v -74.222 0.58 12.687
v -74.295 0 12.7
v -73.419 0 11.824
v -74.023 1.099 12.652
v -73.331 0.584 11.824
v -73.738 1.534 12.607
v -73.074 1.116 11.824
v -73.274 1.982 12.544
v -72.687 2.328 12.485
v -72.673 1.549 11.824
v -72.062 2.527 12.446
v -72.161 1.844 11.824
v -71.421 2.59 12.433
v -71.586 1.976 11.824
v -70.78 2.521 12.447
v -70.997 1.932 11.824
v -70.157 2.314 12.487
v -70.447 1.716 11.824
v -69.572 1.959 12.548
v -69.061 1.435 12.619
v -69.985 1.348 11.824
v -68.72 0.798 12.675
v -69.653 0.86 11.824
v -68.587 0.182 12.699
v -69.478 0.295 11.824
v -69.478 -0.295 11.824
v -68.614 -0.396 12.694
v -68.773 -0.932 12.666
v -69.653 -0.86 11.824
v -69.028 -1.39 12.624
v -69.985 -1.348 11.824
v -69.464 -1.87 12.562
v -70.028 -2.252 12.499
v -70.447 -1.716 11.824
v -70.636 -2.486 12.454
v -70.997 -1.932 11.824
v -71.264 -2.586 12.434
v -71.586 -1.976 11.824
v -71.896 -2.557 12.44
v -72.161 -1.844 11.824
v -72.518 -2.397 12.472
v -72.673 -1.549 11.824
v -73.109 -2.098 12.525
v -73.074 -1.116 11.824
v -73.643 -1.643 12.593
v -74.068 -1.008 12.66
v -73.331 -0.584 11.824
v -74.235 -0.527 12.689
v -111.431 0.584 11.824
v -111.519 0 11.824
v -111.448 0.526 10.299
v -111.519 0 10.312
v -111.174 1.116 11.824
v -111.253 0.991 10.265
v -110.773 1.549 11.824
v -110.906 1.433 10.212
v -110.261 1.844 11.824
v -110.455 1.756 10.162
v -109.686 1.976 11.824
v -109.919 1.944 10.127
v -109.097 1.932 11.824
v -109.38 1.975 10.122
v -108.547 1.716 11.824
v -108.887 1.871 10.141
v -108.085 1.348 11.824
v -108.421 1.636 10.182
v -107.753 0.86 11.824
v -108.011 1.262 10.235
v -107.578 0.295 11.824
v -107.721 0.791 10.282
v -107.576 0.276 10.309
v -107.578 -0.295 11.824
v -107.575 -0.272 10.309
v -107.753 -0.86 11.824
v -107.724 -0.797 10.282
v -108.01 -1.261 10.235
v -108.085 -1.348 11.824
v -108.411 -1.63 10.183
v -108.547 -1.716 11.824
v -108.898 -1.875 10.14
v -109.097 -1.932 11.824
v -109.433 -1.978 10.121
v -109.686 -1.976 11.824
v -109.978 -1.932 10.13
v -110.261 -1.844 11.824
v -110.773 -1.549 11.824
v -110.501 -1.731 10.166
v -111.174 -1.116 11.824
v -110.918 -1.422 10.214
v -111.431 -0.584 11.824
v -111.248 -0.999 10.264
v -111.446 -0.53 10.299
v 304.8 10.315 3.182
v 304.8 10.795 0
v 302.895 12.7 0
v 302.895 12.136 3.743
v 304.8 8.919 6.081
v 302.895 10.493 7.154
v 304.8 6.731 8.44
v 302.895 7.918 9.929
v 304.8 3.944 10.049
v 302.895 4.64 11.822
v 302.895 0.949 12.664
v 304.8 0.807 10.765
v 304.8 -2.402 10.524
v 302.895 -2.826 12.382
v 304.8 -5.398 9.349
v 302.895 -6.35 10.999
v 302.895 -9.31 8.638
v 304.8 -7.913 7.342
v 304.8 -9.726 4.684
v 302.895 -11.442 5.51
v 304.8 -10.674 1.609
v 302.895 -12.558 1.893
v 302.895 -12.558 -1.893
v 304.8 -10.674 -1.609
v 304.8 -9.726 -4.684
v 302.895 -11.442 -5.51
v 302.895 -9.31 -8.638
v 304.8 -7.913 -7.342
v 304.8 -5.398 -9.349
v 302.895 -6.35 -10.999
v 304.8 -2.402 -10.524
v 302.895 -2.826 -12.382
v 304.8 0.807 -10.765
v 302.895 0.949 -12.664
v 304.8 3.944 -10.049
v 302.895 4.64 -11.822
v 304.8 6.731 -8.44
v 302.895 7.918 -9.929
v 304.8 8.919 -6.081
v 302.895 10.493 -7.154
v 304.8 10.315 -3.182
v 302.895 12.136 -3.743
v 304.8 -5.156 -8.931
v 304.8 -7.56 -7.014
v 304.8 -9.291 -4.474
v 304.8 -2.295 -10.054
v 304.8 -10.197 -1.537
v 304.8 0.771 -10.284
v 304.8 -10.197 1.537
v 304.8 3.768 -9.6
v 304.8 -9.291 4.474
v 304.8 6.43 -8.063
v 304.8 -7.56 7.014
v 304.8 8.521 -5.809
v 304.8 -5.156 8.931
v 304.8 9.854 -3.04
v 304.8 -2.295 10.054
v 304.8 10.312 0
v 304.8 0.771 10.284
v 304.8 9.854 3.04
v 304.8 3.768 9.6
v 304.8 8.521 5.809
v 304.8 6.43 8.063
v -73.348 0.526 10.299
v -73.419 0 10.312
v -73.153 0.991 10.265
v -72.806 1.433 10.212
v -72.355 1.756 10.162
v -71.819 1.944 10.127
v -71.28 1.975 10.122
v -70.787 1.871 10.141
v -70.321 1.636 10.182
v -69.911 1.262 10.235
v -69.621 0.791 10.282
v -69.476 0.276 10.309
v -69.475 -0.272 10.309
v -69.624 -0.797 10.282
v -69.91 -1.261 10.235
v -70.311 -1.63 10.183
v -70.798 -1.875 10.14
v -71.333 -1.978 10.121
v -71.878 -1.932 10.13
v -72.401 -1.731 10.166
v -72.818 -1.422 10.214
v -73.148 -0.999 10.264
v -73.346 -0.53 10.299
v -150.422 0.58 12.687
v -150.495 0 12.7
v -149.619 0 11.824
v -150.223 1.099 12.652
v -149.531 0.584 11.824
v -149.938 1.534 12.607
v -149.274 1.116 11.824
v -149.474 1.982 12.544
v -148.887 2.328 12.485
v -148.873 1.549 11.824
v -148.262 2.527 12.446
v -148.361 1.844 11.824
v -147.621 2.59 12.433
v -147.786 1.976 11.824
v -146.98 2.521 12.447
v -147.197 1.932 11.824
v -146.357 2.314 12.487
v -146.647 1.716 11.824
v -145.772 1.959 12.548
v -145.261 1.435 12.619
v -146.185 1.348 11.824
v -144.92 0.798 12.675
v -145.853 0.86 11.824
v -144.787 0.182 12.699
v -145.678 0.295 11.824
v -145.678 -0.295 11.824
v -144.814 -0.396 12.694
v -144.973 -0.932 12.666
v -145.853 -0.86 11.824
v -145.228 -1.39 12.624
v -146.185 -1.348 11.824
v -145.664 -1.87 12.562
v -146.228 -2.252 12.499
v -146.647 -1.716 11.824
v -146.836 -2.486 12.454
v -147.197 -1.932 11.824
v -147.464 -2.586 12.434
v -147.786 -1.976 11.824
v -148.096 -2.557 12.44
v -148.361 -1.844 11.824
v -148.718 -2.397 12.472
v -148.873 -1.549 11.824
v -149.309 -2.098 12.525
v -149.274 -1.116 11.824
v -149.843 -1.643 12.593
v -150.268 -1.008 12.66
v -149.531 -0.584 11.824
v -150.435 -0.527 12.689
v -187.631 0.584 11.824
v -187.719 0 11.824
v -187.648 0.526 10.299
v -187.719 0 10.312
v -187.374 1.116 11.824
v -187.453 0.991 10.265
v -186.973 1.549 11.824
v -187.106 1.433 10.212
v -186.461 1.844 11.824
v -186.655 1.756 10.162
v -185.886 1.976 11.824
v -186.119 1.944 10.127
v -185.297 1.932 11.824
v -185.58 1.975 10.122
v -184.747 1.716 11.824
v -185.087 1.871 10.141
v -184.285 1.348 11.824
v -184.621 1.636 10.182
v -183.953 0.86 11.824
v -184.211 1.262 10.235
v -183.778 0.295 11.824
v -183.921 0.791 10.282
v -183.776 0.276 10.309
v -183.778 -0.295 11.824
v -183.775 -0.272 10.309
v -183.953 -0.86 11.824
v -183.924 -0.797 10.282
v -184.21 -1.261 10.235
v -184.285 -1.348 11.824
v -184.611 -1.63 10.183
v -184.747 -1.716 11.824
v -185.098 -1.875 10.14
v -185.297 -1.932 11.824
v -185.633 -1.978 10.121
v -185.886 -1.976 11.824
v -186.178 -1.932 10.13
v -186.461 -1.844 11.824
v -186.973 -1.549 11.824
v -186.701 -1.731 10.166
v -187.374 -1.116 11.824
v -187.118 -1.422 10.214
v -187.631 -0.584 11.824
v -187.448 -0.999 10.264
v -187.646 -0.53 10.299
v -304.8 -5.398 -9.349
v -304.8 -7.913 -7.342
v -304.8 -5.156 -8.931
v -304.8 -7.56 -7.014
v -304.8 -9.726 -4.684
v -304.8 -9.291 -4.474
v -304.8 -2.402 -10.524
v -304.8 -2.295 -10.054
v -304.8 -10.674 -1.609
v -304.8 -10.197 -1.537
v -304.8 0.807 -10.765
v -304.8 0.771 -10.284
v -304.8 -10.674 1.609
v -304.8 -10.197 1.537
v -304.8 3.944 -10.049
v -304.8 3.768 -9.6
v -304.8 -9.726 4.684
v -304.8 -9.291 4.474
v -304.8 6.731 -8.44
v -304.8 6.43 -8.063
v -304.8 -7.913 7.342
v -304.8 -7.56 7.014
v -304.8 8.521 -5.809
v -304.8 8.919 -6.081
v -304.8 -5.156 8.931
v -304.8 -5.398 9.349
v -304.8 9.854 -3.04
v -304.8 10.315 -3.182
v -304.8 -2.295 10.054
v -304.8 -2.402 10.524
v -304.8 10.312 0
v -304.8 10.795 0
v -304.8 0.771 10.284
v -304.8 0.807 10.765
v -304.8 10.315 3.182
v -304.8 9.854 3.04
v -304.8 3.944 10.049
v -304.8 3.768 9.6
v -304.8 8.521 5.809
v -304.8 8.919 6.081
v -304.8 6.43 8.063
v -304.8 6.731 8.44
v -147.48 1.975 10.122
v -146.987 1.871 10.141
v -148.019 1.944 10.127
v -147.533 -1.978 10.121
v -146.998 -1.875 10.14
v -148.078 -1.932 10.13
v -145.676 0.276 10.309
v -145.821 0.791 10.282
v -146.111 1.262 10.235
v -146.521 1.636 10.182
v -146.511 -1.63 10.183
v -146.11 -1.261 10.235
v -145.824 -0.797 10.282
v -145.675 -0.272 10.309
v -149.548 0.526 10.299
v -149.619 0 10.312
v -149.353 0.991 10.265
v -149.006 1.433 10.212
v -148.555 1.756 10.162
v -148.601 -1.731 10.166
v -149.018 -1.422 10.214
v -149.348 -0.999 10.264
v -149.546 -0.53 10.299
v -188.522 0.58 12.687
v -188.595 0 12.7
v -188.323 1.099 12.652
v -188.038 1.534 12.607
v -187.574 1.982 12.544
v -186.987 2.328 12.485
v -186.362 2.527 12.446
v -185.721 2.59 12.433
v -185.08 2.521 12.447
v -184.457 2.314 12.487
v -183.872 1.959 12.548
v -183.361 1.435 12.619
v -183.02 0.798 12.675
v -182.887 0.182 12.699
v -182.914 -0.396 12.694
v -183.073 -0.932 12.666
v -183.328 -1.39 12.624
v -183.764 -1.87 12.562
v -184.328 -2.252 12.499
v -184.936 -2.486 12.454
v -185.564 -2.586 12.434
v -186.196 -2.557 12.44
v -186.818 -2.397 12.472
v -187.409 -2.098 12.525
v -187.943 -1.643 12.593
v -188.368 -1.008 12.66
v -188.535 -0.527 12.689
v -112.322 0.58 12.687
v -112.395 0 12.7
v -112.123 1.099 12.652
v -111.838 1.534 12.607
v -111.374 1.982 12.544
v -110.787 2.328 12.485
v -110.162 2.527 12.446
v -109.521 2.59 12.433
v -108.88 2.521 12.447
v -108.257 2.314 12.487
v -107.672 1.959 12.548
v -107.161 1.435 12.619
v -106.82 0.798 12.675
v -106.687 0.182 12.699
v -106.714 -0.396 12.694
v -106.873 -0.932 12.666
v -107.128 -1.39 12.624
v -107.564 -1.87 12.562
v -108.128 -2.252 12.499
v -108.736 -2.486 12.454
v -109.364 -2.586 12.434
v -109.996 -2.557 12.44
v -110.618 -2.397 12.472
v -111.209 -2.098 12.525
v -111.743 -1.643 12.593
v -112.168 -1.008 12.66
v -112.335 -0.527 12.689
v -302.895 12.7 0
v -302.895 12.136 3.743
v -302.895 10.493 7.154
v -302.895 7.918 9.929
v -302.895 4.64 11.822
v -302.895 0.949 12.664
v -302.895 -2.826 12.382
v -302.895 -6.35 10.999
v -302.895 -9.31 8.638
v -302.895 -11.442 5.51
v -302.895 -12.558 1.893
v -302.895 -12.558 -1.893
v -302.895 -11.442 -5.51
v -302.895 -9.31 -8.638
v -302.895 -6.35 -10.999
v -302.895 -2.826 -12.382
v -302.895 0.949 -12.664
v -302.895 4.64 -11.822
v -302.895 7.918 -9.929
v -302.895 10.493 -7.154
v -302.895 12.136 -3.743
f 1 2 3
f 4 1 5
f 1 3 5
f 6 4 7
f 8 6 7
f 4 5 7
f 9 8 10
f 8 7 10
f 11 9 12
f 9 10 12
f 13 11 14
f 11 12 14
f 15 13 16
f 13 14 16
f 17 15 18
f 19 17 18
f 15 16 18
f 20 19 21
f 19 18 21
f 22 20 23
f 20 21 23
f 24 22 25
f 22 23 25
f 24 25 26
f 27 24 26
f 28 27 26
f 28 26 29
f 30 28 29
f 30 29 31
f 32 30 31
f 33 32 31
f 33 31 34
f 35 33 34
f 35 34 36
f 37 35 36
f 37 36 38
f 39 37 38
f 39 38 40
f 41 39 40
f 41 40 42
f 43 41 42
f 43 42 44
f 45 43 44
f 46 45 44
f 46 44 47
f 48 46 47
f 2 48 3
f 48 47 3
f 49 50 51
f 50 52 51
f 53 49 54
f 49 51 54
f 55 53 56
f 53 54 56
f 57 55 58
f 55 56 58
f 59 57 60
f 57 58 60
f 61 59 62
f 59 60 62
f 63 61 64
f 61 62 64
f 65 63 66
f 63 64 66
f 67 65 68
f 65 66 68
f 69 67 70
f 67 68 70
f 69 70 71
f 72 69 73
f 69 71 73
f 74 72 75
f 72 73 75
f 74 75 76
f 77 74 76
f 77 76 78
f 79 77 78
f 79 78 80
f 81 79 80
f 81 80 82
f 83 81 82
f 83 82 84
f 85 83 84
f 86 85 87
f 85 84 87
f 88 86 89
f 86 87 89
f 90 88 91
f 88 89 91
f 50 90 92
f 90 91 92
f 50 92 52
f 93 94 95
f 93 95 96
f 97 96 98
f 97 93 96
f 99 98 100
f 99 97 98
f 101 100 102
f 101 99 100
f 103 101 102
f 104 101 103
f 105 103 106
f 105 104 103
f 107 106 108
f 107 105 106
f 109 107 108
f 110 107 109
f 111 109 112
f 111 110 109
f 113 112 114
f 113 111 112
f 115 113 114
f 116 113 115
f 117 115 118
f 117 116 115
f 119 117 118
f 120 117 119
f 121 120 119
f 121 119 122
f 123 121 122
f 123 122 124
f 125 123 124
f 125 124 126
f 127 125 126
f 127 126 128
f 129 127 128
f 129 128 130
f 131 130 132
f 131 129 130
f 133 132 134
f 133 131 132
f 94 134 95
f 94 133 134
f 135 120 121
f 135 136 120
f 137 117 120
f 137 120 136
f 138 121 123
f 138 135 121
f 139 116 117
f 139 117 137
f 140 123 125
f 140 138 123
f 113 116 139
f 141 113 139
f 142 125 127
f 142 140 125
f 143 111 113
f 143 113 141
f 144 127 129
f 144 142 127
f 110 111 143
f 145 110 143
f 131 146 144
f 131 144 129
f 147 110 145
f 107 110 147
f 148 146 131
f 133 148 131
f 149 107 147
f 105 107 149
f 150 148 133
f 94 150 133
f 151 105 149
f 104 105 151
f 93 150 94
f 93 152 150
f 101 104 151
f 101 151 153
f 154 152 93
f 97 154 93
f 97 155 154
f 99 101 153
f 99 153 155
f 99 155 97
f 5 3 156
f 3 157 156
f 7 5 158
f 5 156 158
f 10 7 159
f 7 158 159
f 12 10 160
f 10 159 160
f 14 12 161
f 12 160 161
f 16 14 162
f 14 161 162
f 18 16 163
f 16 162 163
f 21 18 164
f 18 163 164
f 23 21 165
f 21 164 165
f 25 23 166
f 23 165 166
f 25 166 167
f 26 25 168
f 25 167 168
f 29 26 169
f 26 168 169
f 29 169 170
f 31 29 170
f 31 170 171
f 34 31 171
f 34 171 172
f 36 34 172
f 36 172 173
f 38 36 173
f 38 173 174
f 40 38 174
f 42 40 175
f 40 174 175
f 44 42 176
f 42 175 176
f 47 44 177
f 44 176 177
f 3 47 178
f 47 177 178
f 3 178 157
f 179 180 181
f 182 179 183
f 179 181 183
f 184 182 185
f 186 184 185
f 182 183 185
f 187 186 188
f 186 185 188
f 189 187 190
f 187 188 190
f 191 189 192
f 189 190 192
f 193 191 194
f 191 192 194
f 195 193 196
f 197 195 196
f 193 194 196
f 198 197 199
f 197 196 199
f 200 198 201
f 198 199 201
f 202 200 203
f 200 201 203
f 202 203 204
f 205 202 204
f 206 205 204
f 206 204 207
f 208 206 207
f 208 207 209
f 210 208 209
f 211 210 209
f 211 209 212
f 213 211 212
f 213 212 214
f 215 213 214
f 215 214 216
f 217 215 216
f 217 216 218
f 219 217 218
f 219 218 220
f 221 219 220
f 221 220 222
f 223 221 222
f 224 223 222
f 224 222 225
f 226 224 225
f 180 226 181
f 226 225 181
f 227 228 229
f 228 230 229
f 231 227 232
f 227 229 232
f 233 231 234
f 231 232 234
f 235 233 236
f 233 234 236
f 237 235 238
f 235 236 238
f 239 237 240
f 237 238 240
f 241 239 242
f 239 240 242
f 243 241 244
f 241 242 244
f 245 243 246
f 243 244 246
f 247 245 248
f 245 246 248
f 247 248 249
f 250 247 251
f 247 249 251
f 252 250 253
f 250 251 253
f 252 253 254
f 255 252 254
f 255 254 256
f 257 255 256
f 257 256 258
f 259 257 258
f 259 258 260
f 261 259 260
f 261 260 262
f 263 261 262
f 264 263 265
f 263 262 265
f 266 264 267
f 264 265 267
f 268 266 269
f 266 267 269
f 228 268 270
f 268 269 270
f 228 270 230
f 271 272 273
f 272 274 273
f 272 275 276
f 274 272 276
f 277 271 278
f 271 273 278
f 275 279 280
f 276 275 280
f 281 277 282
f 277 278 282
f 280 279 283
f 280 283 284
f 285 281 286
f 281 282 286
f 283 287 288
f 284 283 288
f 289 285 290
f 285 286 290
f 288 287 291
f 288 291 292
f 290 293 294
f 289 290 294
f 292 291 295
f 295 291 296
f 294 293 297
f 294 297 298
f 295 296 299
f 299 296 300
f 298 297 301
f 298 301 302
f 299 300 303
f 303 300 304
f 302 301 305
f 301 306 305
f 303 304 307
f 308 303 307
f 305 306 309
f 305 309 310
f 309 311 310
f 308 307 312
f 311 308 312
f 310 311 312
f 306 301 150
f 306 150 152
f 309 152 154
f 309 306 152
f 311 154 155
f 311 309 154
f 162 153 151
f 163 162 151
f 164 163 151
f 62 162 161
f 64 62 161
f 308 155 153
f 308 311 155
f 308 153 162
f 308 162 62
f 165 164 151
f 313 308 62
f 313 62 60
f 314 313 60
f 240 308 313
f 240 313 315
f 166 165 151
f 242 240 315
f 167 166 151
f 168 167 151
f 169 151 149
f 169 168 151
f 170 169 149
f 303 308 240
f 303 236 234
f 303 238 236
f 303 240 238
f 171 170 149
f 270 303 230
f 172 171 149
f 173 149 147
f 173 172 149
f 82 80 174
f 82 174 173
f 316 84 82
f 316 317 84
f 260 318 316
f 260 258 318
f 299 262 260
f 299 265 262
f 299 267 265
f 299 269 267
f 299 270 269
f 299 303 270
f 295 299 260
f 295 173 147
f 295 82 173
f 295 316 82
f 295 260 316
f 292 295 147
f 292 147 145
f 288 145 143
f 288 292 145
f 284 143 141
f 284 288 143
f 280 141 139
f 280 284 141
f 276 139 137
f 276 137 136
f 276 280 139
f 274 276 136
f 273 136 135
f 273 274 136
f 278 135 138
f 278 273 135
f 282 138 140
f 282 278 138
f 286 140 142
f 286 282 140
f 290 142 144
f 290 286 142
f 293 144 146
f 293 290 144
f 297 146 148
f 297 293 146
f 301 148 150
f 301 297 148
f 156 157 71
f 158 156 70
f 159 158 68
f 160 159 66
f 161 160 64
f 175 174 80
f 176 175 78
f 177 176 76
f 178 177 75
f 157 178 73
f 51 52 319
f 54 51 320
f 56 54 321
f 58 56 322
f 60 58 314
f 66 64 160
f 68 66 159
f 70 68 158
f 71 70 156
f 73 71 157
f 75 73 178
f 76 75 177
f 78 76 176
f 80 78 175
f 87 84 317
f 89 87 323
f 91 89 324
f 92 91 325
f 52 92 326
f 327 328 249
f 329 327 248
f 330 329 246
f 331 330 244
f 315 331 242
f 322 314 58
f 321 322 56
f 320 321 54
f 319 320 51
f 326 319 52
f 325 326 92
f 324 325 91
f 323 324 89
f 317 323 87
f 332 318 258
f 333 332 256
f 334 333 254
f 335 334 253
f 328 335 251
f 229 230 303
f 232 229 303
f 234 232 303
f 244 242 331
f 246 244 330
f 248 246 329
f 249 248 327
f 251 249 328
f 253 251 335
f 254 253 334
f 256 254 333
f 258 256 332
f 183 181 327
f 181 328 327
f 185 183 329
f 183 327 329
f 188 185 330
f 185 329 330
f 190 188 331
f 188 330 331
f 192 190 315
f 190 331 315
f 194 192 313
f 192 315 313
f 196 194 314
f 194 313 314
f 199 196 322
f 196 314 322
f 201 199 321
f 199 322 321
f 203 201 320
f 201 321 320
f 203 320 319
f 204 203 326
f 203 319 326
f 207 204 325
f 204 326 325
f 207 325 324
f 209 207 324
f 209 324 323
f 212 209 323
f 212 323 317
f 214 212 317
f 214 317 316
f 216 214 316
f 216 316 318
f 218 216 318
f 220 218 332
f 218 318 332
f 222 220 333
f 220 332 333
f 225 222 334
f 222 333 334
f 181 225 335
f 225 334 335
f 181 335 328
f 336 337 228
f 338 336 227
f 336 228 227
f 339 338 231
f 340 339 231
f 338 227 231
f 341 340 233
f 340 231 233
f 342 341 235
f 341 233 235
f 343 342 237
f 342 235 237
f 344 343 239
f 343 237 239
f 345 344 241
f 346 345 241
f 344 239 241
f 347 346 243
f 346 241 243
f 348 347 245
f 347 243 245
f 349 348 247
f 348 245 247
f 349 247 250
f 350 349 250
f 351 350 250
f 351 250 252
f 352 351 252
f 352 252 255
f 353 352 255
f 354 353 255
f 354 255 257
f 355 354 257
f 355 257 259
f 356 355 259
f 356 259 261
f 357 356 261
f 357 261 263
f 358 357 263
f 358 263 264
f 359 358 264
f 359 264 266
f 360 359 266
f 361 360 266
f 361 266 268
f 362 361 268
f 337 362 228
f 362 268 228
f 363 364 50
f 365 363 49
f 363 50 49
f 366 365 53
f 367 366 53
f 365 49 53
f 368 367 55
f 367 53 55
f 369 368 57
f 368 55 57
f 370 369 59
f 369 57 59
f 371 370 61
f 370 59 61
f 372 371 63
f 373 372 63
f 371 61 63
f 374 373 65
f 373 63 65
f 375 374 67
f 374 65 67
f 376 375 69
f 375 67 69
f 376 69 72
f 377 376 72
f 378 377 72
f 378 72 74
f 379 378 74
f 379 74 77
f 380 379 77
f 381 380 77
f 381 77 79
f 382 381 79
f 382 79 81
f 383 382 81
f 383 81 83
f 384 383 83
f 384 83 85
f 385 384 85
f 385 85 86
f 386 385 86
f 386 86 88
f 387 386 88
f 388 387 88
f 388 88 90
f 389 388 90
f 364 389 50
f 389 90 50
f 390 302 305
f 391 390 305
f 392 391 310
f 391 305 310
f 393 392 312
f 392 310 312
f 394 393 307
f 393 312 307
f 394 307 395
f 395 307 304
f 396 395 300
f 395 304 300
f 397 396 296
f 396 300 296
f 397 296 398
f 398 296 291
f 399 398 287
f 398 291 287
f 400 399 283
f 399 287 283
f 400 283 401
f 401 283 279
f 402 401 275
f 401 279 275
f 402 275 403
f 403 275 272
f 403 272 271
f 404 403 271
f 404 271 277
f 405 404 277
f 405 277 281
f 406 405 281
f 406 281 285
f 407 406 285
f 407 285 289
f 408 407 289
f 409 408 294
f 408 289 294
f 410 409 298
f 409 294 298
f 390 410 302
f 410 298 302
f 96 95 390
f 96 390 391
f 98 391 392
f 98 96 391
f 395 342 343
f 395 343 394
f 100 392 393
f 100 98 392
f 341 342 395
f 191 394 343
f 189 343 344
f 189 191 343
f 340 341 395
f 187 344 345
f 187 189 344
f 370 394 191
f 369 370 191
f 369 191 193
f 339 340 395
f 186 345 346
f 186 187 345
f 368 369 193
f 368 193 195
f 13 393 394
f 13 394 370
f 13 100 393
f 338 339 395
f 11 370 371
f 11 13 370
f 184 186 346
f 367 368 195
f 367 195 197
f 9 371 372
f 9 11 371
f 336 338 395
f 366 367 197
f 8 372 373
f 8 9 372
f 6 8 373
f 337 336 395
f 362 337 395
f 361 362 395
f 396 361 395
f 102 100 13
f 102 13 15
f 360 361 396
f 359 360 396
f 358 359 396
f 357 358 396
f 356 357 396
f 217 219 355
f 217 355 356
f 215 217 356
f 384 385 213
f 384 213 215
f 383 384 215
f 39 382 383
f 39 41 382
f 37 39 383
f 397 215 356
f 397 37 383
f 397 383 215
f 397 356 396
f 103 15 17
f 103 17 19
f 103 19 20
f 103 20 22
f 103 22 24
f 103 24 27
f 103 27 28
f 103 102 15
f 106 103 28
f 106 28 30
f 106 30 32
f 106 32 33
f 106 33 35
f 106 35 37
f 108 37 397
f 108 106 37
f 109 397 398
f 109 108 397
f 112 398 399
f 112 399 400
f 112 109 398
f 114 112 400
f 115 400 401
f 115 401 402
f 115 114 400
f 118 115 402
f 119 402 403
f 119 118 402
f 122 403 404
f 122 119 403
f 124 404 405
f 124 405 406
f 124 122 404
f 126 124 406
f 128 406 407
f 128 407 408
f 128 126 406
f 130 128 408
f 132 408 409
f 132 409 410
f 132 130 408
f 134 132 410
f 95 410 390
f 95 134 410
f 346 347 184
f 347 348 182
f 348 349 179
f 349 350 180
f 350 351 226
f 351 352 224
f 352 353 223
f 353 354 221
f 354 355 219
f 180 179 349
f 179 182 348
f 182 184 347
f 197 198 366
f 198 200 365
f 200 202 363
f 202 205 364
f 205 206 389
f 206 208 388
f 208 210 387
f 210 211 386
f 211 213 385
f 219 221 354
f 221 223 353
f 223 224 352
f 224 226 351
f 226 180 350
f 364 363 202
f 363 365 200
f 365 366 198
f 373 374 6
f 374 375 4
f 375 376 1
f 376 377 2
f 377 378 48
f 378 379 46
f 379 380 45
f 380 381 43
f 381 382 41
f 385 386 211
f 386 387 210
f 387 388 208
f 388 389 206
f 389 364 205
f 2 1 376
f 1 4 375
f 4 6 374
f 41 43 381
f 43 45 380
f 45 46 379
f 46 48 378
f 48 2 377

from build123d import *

# Parameters (mm, degrees)
F0_R           = 12.7
F0_R_2         = 10.3124
F1_DEPTH       = 304.8
F4_D           = 3.9624
F4_DEPTH       = 12.7
F4_CSINK_D     = 5.715
F4_CSINK_ANGLE = 90
F4_TIP         = 1.1904250584
F5_SIZE        = 1.905
F6_SIZE        = 1.905


with BuildPart() as f1:
    # F0 (on Right) → F1 (new body, symmetric)
    with BuildSketch(Plane.YZ):
        Circle(F0_R)
        Circle(F0_R_2, mode=Mode.SUBTRACT)
    extrude(amount=F1_DEPTH, both=True)

    # F4
    with Locations(Plane.XY.offset(12.7)):
        with Locations((-185.7375, 0), (-147.6375, 0), (-109.5375, 0), (-71.4375, 0)):
            CounterSinkHole(F4_D / 2, F4_CSINK_D / 2, depth=F4_DEPTH, counter_sink_angle=F4_CSINK_ANGLE)
            with Locations((0, 0, -(F4_DEPTH + F4_TIP / 2))):  # 118° drill point
                Cone(0, F4_D / 2, F4_TIP, mode=Mode.SUBTRACT)

    # F5
    f5_edges = [f1.edges().sort_by_distance(p)[0] for p in [
        (-304.8, -12.7, 0),
    ]]
    chamfer(f5_edges, length=F5_SIZE)

    # F6
    f6_edges = [f1.edges().sort_by_distance(p)[0] for p in [
        (304.8, -12.7, 0),
    ]]
    chamfer(f6_edges, length=F6_SIZE)


solid = f1.part
